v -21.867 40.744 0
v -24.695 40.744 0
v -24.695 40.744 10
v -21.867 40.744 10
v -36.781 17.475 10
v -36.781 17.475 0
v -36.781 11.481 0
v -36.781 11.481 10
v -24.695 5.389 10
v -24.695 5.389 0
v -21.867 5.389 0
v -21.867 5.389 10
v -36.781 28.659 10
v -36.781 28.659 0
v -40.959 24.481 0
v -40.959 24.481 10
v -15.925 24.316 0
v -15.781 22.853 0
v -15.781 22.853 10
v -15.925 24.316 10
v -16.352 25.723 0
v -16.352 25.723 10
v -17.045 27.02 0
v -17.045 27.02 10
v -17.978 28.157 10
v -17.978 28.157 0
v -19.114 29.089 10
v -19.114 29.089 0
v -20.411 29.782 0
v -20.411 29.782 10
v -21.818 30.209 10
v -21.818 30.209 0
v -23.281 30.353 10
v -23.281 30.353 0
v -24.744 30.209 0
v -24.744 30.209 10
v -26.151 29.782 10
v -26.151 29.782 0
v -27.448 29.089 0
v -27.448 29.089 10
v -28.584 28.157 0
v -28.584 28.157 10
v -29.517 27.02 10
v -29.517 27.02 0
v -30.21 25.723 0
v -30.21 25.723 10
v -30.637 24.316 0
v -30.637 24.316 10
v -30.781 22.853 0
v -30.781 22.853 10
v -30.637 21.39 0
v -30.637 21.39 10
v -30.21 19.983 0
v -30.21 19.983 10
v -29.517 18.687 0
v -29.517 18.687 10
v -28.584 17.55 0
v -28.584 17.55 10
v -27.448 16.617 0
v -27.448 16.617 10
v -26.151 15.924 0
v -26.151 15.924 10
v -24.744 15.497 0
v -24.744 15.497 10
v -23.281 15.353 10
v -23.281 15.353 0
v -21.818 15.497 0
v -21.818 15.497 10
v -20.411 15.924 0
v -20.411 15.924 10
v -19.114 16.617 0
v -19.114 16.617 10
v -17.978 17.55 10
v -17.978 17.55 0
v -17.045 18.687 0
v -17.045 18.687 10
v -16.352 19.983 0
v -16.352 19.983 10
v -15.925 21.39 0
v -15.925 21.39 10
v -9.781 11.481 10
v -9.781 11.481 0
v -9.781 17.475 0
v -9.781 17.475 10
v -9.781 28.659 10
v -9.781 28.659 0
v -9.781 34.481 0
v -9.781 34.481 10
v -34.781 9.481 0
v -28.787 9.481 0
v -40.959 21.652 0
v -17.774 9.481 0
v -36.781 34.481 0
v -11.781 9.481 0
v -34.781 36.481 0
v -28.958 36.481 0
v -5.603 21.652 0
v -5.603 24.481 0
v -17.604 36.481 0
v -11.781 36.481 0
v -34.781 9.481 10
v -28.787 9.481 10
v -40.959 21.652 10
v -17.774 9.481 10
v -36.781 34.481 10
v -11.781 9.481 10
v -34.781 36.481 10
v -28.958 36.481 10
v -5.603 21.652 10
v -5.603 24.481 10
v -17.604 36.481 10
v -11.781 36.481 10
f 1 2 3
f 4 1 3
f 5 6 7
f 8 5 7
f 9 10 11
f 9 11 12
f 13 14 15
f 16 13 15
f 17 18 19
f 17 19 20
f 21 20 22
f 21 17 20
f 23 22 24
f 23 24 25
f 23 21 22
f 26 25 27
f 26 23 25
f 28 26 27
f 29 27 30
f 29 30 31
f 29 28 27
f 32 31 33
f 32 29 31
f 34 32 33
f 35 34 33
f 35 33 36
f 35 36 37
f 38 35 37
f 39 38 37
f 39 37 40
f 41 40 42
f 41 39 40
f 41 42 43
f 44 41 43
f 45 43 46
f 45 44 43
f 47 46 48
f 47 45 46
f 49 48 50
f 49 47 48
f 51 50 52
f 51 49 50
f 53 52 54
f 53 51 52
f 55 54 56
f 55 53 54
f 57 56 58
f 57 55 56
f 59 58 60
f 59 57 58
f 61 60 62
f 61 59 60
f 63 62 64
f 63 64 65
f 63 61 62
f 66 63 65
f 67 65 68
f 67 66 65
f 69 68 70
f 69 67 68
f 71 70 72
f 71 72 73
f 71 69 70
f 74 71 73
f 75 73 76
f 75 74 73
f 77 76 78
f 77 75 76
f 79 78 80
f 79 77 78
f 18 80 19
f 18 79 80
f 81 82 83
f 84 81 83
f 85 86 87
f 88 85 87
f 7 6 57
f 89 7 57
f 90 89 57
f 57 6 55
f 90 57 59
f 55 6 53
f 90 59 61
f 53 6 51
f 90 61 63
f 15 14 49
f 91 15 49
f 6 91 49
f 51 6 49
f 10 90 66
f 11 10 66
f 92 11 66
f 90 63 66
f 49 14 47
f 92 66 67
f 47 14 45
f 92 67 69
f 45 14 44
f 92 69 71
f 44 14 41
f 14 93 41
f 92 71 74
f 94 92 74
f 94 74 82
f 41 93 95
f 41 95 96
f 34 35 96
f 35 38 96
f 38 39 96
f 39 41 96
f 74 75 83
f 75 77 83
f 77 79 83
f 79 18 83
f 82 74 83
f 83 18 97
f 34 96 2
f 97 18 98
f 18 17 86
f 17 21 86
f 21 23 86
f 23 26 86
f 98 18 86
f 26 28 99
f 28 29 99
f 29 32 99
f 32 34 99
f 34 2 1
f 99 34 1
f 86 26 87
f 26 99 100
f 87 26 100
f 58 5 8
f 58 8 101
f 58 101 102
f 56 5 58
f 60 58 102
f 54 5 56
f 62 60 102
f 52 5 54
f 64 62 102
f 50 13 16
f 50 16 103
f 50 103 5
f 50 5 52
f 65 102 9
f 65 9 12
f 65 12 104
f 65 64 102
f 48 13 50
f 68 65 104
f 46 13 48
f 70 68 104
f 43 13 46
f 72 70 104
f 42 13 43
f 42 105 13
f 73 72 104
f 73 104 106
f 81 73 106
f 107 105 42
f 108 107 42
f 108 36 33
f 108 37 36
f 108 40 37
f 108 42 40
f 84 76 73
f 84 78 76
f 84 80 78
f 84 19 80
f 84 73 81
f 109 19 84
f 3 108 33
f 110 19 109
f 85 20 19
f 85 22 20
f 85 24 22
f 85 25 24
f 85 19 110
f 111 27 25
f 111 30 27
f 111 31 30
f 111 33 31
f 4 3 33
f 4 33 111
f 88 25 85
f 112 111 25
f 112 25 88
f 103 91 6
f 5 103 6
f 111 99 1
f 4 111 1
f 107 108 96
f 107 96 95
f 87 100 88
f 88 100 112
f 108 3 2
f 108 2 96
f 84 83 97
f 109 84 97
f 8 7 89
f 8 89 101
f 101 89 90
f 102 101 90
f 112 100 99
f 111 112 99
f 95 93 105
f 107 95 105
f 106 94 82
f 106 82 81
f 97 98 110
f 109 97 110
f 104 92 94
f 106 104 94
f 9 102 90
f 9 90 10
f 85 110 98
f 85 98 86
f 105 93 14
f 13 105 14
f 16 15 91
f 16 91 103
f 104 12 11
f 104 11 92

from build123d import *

# Parameters (mm, degrees)
F0_R     = 7.5
F1_DEPTH = 10
F2_SIZE  = 2
F3_SIZE  = 2


with BuildPart() as f1:
    # F0 (on Top) → F1 (new body)
    with BuildSketch(Plane.XY):
        Polygon((-23.2808627188, 42.1585307921), (-28.9580689277, 36.4813245833), (-17.60365651, 36.4813245833), align=None)
        Polygon((-4.1889796268, 23.0666477001), (-9.7808627188, 28.6585307921), (-9.7808627188, 17.4747646081), align=None)
        Polygon((-17.7743027436, 9.4813245833), (-28.787422694, 9.4813245833), (-23.2808627188, 3.9747646081), align=None)
        Polygon((-17.60365651, 36.4813245833), (-28.9580689277, 36.4813245833), (-36.7808627188, 28.6585307921), (-36.7808627188, 17.4747646081), (-28.787422694, 9.4813245833), (-17.7743027436, 9.4813245833), (-9.7808627188, 17.4747646081), (-9.7808627188, 28.6585307921), align=None)
        with Locations((-23.2808627188, 22.8532869369)):
            Circle(F0_R, mode=Mode.SUBTRACT)
        Polygon((-36.7808627188, 17.4747646081), (-36.7808627188, 28.6585307921), (-42.3727458109, 23.0666477001), align=None)
        Polygon((-9.7808627188, 36.4813245833), (-17.60365651, 36.4813245833), (-9.7808627188, 28.6585307921), align=None)
        Polygon((-28.9580689277, 36.4813245833), (-36.7808627188, 36.4813245833), (-36.7808627188, 28.6585307921), align=None)
        Polygon((-28.787422694, 9.4813245833), (-36.7808627188, 17.4747646081), (-36.7808627188, 9.4813245833), align=None)
        Polygon((-9.7808627188, 9.4813245833), (-9.7808627188, 17.4747646081), (-17.7743027436, 9.4813245833), align=None)
    extrude(amount=F1_DEPTH)

    # F2
    f2_edges = [f1.edges().sort_by_distance(p)[0] for p in [
        (-4.18898, 23.066648, 5),
    ]]
    chamfer(f2_edges, length=F2_SIZE)

    # F3
    f3_edges = [f1.edges().sort_by_distance(p)[0] for p in [
        (-9.780863, 9.481325, 5),
        (-23.280863, 3.974765, 5),
        (-36.780863, 9.481325, 5),
        (-9.780863, 36.481325, 5),
        (-23.280863, 42.158531, 5),
        (-36.780863, 36.481325, 5),
        (-42.372746, 23.066648, 5),
    ]]
    chamfer(f3_edges, length=F3_SIZE)


solid = f1.part
